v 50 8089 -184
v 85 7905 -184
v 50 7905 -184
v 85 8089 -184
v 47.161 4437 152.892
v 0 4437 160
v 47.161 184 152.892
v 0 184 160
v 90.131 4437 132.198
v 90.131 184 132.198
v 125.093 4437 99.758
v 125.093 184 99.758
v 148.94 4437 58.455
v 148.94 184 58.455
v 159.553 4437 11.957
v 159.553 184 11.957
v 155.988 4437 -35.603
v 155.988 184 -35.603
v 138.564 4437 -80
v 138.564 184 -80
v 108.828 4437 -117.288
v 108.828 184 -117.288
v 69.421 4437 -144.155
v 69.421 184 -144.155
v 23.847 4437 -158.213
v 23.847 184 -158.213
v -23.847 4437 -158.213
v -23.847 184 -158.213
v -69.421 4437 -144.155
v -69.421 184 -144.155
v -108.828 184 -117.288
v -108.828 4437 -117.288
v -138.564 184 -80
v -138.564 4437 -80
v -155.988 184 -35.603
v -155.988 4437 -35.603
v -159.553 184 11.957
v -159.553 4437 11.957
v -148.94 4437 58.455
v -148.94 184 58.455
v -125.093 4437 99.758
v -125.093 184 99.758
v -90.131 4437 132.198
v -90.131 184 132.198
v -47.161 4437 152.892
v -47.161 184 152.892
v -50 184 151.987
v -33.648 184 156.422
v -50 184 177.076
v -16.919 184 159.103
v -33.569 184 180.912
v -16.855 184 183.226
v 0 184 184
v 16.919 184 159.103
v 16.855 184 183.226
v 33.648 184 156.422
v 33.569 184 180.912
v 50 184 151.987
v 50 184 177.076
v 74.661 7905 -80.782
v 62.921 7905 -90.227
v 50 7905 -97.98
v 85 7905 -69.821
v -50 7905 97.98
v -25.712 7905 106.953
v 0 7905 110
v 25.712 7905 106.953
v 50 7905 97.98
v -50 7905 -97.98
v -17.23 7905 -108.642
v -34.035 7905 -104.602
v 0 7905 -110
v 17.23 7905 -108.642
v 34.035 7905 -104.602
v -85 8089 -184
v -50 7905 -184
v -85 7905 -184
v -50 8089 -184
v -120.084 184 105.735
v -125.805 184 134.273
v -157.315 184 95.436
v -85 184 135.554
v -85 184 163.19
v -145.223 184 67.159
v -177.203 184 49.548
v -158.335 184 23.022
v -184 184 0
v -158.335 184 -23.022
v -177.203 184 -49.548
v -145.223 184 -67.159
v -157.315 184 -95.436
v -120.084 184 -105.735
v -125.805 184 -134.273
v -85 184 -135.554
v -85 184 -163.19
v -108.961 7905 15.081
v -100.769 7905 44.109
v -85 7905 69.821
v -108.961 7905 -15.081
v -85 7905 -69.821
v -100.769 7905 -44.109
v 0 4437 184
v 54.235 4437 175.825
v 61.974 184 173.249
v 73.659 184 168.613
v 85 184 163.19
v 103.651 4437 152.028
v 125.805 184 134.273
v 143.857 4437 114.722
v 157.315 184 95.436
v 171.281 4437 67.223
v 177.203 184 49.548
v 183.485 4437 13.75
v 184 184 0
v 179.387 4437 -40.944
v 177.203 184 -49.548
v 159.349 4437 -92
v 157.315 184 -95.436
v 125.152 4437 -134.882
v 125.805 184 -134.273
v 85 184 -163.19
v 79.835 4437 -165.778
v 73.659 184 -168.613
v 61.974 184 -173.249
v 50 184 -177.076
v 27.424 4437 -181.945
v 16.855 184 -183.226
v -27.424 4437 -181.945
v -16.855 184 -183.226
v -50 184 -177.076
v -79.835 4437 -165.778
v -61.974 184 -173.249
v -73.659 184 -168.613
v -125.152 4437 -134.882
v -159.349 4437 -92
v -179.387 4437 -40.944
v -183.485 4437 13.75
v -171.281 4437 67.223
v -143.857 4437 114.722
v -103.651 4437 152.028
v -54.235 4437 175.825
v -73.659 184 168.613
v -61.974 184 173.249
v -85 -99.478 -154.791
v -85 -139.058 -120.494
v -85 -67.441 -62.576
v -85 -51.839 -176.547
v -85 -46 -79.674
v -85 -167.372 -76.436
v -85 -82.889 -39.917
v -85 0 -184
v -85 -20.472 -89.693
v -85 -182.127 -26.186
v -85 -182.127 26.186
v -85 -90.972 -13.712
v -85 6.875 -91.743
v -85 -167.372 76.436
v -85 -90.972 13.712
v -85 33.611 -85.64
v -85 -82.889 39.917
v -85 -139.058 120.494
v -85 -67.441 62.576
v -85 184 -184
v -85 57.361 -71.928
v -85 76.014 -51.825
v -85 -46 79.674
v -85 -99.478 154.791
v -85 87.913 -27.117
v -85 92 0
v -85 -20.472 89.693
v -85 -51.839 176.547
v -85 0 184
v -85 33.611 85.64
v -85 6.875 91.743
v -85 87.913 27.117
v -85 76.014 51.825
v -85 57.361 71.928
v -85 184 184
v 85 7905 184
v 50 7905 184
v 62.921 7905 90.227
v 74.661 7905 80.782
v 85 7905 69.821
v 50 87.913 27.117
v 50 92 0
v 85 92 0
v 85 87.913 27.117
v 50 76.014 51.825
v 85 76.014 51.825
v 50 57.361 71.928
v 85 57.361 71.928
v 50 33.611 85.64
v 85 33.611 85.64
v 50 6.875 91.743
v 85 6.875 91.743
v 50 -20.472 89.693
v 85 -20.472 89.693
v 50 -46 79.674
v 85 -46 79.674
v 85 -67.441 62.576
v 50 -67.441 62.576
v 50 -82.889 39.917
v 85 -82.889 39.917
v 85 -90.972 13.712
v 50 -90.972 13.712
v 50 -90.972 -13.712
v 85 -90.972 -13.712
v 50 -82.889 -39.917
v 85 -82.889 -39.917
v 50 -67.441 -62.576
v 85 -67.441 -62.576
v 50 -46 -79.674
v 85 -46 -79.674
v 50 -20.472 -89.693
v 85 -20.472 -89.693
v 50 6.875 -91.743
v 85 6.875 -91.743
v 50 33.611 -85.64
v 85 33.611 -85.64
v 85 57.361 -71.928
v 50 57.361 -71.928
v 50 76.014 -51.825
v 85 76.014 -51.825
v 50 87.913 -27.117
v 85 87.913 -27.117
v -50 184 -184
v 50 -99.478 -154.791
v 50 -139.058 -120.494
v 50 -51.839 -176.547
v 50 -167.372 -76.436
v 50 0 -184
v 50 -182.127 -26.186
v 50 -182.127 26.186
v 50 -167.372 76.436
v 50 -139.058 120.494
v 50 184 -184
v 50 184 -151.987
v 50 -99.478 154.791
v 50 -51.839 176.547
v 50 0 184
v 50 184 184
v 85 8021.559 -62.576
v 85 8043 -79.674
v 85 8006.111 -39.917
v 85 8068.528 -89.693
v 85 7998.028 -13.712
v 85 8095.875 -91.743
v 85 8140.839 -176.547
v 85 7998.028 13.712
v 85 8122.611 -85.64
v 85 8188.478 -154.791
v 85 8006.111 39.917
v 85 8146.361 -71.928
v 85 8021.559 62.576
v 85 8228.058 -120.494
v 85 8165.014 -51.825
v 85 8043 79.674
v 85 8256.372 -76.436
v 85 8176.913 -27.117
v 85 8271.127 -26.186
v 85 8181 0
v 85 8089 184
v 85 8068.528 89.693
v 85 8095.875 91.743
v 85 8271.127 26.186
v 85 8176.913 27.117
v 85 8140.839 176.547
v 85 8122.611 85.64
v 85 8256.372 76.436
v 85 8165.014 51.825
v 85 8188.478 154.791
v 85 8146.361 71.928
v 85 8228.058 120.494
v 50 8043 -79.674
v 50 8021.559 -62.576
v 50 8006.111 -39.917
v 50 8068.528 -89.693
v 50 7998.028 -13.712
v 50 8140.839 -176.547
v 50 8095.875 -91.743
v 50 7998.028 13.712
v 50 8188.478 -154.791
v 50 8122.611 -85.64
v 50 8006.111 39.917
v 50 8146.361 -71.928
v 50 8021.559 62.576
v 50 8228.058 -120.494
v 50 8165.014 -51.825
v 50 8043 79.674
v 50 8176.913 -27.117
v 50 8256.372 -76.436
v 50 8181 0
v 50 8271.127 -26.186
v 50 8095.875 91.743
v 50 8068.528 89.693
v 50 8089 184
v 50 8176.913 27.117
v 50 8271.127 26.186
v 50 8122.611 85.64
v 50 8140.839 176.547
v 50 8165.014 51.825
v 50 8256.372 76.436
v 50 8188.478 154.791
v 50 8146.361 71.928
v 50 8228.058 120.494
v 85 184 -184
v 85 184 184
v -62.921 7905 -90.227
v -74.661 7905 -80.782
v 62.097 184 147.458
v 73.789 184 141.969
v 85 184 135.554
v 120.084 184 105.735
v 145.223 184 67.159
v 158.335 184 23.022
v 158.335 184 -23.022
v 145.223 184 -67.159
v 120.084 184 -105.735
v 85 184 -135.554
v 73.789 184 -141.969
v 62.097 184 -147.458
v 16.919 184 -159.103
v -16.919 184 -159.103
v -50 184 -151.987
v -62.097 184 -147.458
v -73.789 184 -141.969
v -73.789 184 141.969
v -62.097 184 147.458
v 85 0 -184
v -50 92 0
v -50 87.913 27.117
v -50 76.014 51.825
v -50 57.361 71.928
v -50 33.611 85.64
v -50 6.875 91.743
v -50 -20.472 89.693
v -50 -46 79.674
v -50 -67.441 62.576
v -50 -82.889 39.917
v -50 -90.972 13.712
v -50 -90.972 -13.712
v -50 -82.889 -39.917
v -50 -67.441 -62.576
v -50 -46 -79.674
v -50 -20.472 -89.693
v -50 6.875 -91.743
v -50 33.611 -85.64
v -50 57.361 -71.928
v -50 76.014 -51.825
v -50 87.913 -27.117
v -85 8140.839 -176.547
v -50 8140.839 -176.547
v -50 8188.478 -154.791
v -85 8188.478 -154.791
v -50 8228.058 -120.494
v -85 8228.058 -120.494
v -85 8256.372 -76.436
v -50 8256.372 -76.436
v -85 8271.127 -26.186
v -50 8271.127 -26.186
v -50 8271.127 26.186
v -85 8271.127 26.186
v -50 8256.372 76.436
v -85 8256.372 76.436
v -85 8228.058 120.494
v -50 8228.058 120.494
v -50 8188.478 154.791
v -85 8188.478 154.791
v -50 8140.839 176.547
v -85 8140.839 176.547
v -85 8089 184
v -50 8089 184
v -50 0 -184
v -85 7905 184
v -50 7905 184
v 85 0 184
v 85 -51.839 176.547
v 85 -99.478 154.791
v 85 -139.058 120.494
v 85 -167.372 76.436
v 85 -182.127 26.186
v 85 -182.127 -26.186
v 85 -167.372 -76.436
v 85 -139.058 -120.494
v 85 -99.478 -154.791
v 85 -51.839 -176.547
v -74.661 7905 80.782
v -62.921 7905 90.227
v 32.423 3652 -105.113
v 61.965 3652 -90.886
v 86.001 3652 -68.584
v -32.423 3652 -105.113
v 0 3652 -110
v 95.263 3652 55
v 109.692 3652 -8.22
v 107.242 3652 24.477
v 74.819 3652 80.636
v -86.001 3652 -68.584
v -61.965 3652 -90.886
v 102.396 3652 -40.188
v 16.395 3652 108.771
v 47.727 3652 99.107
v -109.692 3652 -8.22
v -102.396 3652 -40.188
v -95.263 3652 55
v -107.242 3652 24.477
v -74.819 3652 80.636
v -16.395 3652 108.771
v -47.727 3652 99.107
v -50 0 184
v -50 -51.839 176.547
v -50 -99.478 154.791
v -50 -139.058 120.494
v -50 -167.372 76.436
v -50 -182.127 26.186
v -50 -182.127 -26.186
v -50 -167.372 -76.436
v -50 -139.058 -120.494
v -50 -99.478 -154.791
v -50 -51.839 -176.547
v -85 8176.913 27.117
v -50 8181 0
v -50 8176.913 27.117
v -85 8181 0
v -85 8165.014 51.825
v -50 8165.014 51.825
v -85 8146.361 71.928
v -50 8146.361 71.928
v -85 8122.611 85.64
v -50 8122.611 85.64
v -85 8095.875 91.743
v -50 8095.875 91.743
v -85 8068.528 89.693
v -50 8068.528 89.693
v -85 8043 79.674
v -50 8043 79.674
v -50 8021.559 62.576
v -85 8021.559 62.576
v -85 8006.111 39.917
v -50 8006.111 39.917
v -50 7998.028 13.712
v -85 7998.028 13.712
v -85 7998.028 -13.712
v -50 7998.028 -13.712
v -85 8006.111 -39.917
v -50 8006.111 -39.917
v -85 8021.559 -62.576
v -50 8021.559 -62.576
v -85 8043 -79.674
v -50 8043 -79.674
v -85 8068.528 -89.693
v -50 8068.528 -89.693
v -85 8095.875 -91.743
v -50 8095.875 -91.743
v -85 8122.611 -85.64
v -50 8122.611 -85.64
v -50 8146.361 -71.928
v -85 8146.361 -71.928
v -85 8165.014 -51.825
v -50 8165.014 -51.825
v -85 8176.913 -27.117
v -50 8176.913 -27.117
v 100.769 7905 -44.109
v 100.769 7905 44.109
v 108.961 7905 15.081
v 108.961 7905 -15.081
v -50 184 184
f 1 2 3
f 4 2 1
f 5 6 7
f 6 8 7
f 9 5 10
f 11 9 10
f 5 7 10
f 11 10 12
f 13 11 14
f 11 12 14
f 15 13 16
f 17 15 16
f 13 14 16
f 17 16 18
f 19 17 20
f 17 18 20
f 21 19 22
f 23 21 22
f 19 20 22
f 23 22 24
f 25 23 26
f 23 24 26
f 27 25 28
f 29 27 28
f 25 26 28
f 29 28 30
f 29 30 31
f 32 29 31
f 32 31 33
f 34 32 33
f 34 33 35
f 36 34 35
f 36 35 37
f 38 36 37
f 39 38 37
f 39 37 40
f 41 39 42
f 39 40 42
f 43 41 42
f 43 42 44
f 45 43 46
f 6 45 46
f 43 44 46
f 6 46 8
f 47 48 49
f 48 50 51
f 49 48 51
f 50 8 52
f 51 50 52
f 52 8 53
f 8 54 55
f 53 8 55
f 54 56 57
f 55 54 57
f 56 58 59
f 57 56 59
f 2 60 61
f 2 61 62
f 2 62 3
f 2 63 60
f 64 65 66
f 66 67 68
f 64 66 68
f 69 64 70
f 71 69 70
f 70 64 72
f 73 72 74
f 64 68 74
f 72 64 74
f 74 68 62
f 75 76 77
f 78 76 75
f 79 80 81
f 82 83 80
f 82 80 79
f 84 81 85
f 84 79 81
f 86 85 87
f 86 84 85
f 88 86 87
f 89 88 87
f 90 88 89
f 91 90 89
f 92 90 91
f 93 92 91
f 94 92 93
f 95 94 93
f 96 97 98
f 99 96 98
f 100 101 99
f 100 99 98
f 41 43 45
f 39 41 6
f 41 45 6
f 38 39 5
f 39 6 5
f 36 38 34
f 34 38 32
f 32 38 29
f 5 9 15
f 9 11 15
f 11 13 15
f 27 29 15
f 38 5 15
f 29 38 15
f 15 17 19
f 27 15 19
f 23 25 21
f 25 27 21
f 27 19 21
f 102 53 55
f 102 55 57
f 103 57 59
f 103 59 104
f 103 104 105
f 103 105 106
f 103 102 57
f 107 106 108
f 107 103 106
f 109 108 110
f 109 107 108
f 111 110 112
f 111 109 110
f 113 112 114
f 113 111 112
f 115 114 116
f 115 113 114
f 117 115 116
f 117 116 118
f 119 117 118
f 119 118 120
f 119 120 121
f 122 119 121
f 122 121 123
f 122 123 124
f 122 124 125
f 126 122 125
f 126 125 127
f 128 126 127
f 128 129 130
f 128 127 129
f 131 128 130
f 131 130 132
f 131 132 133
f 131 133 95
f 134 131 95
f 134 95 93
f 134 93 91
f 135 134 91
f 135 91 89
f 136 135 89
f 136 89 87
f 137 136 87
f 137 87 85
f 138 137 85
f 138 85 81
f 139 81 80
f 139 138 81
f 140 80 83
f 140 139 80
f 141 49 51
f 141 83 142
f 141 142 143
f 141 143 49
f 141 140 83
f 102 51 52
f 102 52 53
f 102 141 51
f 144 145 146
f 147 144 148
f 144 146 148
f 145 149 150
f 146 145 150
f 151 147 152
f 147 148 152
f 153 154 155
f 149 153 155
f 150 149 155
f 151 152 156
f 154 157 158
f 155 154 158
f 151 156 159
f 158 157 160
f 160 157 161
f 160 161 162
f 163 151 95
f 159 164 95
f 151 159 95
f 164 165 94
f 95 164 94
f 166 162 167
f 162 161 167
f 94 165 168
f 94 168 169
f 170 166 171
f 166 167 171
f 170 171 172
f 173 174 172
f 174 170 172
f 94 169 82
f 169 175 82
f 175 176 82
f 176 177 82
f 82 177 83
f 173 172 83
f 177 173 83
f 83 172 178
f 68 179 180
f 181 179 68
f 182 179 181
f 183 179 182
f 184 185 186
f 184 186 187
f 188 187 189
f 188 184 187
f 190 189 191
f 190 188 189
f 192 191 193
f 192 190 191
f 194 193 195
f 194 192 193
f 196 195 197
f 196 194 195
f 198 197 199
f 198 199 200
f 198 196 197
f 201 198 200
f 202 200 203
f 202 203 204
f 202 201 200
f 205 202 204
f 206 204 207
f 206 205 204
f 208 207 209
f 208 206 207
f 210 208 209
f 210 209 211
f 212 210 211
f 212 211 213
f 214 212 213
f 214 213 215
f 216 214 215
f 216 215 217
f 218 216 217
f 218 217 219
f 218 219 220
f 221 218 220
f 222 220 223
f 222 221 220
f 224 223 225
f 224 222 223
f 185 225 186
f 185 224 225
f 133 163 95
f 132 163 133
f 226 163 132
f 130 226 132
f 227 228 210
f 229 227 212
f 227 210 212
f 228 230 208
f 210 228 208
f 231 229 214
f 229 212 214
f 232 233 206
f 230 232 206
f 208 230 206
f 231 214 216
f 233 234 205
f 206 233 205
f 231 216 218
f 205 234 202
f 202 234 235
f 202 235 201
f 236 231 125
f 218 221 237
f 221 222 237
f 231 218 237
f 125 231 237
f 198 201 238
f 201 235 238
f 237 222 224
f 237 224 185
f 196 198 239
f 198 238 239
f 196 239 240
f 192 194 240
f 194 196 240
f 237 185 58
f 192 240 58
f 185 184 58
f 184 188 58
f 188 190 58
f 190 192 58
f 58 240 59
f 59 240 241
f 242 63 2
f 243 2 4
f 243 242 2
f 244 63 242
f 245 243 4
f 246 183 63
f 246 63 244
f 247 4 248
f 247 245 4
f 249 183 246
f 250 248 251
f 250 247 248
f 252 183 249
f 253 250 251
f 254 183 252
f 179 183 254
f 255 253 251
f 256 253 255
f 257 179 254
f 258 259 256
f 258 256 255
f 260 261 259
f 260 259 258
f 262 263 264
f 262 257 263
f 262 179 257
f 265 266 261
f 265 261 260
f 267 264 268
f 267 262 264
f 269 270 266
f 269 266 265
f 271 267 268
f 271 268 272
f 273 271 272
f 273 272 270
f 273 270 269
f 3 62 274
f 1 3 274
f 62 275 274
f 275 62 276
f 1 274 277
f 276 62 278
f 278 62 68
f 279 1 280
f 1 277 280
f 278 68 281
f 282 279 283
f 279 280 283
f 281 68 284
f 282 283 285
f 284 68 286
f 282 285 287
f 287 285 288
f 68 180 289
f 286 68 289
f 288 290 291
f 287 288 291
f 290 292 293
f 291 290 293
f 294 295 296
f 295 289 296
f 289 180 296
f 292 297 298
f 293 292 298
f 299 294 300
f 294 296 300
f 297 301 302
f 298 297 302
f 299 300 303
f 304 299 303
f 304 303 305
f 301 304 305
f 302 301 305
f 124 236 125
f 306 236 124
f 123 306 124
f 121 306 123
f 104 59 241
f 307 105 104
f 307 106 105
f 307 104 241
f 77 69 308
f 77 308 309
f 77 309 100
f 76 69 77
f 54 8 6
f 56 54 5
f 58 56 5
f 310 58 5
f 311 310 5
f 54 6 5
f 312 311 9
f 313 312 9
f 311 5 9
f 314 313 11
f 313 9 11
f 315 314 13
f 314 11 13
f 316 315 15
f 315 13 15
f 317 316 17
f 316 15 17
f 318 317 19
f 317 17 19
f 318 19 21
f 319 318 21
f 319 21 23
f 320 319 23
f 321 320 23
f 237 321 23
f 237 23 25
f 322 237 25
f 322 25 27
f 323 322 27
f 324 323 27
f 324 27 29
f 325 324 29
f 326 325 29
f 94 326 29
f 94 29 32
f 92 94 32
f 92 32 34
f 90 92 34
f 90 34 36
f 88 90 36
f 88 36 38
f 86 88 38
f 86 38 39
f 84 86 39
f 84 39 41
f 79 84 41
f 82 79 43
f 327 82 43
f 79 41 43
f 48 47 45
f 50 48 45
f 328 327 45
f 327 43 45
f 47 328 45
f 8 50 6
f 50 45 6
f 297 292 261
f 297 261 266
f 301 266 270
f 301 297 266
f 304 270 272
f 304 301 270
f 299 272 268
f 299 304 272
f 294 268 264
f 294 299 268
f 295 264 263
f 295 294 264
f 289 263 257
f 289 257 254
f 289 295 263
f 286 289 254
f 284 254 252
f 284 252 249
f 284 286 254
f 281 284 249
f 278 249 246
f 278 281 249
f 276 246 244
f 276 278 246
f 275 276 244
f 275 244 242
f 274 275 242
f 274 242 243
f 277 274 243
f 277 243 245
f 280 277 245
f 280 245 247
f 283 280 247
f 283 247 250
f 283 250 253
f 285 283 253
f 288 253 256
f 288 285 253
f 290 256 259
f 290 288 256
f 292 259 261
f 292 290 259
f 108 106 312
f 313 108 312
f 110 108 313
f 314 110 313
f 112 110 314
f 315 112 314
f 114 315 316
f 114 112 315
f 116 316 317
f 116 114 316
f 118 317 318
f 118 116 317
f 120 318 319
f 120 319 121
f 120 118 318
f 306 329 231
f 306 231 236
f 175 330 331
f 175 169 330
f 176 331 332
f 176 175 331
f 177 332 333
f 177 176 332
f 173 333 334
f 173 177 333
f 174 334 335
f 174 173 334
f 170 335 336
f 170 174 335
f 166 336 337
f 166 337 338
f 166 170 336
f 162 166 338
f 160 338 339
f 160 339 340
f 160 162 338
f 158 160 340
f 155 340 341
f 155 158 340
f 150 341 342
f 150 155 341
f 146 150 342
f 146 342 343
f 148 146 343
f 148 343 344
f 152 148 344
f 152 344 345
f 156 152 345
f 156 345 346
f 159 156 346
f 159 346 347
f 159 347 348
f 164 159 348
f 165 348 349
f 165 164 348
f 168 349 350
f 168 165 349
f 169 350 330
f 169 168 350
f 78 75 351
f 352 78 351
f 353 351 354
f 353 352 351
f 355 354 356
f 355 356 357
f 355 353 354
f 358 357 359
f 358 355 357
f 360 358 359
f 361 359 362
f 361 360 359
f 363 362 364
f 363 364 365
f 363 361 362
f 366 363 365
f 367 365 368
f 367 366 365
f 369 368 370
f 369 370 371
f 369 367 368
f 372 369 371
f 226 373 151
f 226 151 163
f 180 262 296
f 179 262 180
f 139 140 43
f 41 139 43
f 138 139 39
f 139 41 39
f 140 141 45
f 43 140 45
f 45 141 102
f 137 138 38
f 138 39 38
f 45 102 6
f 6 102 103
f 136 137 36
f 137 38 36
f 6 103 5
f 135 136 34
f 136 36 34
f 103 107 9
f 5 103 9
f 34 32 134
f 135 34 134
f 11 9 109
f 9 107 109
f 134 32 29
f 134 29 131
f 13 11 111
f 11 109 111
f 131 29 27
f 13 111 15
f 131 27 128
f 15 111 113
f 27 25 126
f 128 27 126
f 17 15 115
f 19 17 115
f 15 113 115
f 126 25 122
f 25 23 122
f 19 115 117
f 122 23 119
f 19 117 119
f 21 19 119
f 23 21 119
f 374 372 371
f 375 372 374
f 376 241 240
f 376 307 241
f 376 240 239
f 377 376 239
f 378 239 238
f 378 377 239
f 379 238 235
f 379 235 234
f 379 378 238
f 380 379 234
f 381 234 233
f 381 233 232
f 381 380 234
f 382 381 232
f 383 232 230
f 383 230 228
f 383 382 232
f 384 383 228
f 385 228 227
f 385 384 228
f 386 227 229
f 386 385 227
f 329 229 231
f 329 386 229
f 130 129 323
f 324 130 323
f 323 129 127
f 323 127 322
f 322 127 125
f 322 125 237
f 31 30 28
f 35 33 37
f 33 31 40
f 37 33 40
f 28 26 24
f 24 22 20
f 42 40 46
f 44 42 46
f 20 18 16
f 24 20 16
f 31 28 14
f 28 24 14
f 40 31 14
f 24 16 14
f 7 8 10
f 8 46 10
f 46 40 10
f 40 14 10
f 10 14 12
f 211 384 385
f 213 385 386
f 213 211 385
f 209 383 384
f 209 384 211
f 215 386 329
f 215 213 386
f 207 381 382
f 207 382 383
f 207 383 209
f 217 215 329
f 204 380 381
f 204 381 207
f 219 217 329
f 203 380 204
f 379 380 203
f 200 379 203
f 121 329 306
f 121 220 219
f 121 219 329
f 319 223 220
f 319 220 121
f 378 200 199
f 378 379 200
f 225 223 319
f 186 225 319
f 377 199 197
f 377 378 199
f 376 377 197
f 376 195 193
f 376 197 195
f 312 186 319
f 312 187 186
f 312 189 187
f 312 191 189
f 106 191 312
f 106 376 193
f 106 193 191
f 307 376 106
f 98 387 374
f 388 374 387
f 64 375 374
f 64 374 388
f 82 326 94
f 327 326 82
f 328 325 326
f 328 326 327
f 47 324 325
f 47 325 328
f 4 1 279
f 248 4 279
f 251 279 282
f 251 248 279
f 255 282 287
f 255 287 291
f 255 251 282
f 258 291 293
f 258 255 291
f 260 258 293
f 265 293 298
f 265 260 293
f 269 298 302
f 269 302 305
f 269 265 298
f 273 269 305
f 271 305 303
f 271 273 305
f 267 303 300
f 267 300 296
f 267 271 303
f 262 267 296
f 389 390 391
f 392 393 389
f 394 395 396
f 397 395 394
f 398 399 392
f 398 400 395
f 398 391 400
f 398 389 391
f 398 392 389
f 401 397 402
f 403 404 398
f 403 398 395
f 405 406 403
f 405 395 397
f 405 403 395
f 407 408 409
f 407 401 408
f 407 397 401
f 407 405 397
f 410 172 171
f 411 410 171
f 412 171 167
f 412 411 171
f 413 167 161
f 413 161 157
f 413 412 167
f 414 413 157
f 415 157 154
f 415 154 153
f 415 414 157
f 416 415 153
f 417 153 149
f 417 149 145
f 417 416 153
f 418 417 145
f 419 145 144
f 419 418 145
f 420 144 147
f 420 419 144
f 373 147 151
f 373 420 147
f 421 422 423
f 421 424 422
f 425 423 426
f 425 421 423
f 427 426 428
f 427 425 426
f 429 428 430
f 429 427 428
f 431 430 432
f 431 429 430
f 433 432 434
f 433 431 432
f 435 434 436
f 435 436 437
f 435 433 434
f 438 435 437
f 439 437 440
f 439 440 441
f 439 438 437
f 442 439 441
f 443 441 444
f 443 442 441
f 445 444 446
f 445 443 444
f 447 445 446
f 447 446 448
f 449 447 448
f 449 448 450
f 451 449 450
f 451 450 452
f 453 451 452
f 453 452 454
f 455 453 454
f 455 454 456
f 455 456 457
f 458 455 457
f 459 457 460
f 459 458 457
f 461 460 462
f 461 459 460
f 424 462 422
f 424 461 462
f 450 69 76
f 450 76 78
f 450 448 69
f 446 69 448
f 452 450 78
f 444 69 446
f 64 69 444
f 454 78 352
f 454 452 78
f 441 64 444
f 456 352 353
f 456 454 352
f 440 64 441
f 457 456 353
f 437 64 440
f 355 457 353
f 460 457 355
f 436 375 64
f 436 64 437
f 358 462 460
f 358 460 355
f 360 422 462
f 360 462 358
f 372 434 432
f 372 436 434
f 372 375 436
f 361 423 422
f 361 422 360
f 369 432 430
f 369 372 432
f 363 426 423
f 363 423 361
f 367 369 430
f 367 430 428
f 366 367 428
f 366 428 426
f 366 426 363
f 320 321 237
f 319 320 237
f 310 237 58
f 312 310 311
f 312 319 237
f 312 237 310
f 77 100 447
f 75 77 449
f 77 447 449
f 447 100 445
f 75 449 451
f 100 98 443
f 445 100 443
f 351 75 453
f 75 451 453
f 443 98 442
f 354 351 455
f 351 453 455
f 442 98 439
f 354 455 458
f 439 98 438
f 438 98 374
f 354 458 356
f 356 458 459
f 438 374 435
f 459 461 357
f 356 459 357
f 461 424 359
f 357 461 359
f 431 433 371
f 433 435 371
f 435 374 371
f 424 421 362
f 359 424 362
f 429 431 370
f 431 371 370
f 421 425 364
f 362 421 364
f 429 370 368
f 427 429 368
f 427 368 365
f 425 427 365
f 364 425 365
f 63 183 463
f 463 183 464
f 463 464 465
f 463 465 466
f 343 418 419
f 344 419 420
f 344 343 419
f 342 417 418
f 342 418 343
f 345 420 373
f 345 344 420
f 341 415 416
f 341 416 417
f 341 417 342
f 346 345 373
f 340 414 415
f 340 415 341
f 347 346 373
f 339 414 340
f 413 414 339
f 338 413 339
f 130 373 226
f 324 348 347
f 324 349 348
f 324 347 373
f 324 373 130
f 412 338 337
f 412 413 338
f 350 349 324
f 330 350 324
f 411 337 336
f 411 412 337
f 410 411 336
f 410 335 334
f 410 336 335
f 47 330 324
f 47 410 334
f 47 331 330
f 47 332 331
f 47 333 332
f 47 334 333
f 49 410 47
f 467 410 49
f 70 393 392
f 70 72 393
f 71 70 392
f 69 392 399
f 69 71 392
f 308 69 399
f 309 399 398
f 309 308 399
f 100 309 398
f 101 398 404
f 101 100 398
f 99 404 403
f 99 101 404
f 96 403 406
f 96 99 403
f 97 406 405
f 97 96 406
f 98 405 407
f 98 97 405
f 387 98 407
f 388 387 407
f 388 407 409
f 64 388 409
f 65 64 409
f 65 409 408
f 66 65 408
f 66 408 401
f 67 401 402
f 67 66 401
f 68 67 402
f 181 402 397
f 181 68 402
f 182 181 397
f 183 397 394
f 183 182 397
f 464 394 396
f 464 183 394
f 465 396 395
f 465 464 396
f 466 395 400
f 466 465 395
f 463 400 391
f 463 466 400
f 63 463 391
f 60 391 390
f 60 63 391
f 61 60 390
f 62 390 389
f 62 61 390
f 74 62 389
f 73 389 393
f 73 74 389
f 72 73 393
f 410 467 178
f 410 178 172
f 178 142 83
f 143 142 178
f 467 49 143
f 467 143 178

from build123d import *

# Parameters (mm, degrees)
F0_W     = 4253
F0_H     = 24
F0_R     = 92
F3_DEPTH = 85
F4_DEPTH = 50
F5_DEPTH = 85
F6_DEPTH = 50


with BuildPart() as f1:
    # F0 (on Right) → F1 (revolve)
    with BuildSketch(Plane.YZ):
        with Locations((2310.5, 172)):
            Rectangle(F0_W, F0_H)
    revolve(axis=Axis((0, 2310.5, 0), (0, 1, 0)))

    # F0 (on Right) → F3 (join, symmetric)
    with BuildSketch(Plane.YZ):
        with BuildLine():
            ThreePointArc((0, -184), (130.1076477383, -130.1076477383), (184, 0))
            ThreePointArc((184, 0), (130.1076477383, 130.1076477383), (0, 184))
            ThreePointArc((0, 184), (-184, 0), (0, -184))
        make_face()
        Circle(F0_R, mode=Mode.SUBTRACT)
        with BuildLine():
            ThreePointArc((0, 184), (130.1076477383, 130.1076477383), (184, 0))
            Line((184, 0), (184, 160))
            Line((184, 160), (184, 184))
            Line((184, 184), (0, 184))
        make_face()
        with BuildLine():
            Line((184, -184), (184, 0))
            ThreePointArc((184, 0), (130.1076477383, -130.1076477383), (0, -184))
            Line((0, -184), (184, -184))
        make_face()
    extrude(amount=F3_DEPTH, both=True)

    # F0 (on Right) → F4 (cut, symmetric)
    with BuildSketch(Plane.YZ):
        with BuildLine():
            ThreePointArc((0, -184), (130.1076477383, -130.1076477383), (184, 0))
            ThreePointArc((184, 0), (130.1076477383, 130.1076477383), (0, 184))
            ThreePointArc((0, 184), (-184, 0), (0, -184))
        make_face()
        Circle(F0_R, mode=Mode.SUBTRACT)
        with BuildLine():
            ThreePointArc((0, 184), (130.1076477383, 130.1076477383), (184, 0))
            Line((184, 0), (184, 160))
            Line((184, 160), (184, 184))
            Line((184, 184), (0, 184))
        make_face()
        with BuildLine():
            Line((184, -184), (184, 0))
            ThreePointArc((184, 0), (130.1076477383, -130.1076477383), (0, -184))
            Line((0, -184), (184, -184))
        make_face()
    extrude(amount=F4_DEPTH, both=True, mode=Mode.SUBTRACT)


with BuildPart() as f2:
    # F0 (on Right) → F2 (revolve)
    with BuildSketch(Plane.YZ):
        Polygon((4437, 0), (3652, 0), (3652, -110), (7905, -110), (7905, 0), align=None)
    revolve(axis=Axis((0, 6171, 0), (0, 1, 0)))

    # F0 (on Right) → F5 (join, symmetric)
    with BuildSketch(Plane.YZ):
        with BuildLine():
            ThreePointArc((8089, 184), (7958.8923522617, 130.1076477383), (7905, 0))
            ThreePointArc((7905, 0), (7958.8923522617, -130.1076477383), (8089, -184))
            ThreePointArc((8089, -184), (8219.1076477383, -130.1076477383), (8273, 0))
            ThreePointArc((8273, 0), (8219.1076477383, 130.1076477383), (8089, 184))
        make_face()
        with Locations((8089, 0)):
            Circle(F0_R, mode=Mode.SUBTRACT)
        with BuildLine():
            Line((7905, 184), (7905, 0))
            ThreePointArc((7905, 0), (7958.8923522617, 130.1076477383), (8089, 184))
            Line((8089, 184), (7905, 184))
        make_face()
        with BuildLine():
            ThreePointArc((8089, -184), (7958.8923522617, -130.1076477383), (7905, 0))
            Line((7905, 0), (7905, -110))
            Line((7905, -110), (7905, -184))
            Line((7905, -184), (8089, -184))
        make_face()
    extrude(amount=F5_DEPTH, both=True)

    # F0 (on Right) → F6 (cut, symmetric)
    with BuildSketch(Plane.YZ):
        with BuildLine():
            Line((7905, 184), (7905, 0))
            ThreePointArc((7905, 0), (7958.8923522617, 130.1076477383), (8089, 184))
            Line((8089, 184), (7905, 184))
        make_face()
        with BuildLine():
            ThreePointArc((8089, 184), (7958.8923522617, 130.1076477383), (7905, 0))
            ThreePointArc((7905, 0), (7958.8923522617, -130.1076477383), (8089, -184))
            ThreePointArc((8089, -184), (8219.1076477383, -130.1076477383), (8273, 0))
            ThreePointArc((8273, 0), (8219.1076477383, 130.1076477383), (8089, 184))
        make_face()
        with Locations((8089, 0)):
            Circle(F0_R, mode=Mode.SUBTRACT)
        with BuildLine():
            ThreePointArc((8089, -184), (7958.8923522617, -130.1076477383), (7905, 0))
            Line((7905, 0), (7905, -110))
            Line((7905, -110), (7905, -184))
            Line((7905, -184), (8089, -184))
        make_face()
    extrude(amount=F6_DEPTH, both=True, mode=Mode.SUBTRACT)


with BuildPart() as f7:
    # F0 (on Right) → F7 (revolve)
    with BuildSketch(Plane.YZ):
        Polygon((184, 160), (184, 0), (3652, 0), (4437, 0), (4437, 160), align=None)
    revolve(axis=Axis((0, 2310.5, 0), (0, 1, 0)))


solid = Compound([f1.part, f2.part, f7.part])
